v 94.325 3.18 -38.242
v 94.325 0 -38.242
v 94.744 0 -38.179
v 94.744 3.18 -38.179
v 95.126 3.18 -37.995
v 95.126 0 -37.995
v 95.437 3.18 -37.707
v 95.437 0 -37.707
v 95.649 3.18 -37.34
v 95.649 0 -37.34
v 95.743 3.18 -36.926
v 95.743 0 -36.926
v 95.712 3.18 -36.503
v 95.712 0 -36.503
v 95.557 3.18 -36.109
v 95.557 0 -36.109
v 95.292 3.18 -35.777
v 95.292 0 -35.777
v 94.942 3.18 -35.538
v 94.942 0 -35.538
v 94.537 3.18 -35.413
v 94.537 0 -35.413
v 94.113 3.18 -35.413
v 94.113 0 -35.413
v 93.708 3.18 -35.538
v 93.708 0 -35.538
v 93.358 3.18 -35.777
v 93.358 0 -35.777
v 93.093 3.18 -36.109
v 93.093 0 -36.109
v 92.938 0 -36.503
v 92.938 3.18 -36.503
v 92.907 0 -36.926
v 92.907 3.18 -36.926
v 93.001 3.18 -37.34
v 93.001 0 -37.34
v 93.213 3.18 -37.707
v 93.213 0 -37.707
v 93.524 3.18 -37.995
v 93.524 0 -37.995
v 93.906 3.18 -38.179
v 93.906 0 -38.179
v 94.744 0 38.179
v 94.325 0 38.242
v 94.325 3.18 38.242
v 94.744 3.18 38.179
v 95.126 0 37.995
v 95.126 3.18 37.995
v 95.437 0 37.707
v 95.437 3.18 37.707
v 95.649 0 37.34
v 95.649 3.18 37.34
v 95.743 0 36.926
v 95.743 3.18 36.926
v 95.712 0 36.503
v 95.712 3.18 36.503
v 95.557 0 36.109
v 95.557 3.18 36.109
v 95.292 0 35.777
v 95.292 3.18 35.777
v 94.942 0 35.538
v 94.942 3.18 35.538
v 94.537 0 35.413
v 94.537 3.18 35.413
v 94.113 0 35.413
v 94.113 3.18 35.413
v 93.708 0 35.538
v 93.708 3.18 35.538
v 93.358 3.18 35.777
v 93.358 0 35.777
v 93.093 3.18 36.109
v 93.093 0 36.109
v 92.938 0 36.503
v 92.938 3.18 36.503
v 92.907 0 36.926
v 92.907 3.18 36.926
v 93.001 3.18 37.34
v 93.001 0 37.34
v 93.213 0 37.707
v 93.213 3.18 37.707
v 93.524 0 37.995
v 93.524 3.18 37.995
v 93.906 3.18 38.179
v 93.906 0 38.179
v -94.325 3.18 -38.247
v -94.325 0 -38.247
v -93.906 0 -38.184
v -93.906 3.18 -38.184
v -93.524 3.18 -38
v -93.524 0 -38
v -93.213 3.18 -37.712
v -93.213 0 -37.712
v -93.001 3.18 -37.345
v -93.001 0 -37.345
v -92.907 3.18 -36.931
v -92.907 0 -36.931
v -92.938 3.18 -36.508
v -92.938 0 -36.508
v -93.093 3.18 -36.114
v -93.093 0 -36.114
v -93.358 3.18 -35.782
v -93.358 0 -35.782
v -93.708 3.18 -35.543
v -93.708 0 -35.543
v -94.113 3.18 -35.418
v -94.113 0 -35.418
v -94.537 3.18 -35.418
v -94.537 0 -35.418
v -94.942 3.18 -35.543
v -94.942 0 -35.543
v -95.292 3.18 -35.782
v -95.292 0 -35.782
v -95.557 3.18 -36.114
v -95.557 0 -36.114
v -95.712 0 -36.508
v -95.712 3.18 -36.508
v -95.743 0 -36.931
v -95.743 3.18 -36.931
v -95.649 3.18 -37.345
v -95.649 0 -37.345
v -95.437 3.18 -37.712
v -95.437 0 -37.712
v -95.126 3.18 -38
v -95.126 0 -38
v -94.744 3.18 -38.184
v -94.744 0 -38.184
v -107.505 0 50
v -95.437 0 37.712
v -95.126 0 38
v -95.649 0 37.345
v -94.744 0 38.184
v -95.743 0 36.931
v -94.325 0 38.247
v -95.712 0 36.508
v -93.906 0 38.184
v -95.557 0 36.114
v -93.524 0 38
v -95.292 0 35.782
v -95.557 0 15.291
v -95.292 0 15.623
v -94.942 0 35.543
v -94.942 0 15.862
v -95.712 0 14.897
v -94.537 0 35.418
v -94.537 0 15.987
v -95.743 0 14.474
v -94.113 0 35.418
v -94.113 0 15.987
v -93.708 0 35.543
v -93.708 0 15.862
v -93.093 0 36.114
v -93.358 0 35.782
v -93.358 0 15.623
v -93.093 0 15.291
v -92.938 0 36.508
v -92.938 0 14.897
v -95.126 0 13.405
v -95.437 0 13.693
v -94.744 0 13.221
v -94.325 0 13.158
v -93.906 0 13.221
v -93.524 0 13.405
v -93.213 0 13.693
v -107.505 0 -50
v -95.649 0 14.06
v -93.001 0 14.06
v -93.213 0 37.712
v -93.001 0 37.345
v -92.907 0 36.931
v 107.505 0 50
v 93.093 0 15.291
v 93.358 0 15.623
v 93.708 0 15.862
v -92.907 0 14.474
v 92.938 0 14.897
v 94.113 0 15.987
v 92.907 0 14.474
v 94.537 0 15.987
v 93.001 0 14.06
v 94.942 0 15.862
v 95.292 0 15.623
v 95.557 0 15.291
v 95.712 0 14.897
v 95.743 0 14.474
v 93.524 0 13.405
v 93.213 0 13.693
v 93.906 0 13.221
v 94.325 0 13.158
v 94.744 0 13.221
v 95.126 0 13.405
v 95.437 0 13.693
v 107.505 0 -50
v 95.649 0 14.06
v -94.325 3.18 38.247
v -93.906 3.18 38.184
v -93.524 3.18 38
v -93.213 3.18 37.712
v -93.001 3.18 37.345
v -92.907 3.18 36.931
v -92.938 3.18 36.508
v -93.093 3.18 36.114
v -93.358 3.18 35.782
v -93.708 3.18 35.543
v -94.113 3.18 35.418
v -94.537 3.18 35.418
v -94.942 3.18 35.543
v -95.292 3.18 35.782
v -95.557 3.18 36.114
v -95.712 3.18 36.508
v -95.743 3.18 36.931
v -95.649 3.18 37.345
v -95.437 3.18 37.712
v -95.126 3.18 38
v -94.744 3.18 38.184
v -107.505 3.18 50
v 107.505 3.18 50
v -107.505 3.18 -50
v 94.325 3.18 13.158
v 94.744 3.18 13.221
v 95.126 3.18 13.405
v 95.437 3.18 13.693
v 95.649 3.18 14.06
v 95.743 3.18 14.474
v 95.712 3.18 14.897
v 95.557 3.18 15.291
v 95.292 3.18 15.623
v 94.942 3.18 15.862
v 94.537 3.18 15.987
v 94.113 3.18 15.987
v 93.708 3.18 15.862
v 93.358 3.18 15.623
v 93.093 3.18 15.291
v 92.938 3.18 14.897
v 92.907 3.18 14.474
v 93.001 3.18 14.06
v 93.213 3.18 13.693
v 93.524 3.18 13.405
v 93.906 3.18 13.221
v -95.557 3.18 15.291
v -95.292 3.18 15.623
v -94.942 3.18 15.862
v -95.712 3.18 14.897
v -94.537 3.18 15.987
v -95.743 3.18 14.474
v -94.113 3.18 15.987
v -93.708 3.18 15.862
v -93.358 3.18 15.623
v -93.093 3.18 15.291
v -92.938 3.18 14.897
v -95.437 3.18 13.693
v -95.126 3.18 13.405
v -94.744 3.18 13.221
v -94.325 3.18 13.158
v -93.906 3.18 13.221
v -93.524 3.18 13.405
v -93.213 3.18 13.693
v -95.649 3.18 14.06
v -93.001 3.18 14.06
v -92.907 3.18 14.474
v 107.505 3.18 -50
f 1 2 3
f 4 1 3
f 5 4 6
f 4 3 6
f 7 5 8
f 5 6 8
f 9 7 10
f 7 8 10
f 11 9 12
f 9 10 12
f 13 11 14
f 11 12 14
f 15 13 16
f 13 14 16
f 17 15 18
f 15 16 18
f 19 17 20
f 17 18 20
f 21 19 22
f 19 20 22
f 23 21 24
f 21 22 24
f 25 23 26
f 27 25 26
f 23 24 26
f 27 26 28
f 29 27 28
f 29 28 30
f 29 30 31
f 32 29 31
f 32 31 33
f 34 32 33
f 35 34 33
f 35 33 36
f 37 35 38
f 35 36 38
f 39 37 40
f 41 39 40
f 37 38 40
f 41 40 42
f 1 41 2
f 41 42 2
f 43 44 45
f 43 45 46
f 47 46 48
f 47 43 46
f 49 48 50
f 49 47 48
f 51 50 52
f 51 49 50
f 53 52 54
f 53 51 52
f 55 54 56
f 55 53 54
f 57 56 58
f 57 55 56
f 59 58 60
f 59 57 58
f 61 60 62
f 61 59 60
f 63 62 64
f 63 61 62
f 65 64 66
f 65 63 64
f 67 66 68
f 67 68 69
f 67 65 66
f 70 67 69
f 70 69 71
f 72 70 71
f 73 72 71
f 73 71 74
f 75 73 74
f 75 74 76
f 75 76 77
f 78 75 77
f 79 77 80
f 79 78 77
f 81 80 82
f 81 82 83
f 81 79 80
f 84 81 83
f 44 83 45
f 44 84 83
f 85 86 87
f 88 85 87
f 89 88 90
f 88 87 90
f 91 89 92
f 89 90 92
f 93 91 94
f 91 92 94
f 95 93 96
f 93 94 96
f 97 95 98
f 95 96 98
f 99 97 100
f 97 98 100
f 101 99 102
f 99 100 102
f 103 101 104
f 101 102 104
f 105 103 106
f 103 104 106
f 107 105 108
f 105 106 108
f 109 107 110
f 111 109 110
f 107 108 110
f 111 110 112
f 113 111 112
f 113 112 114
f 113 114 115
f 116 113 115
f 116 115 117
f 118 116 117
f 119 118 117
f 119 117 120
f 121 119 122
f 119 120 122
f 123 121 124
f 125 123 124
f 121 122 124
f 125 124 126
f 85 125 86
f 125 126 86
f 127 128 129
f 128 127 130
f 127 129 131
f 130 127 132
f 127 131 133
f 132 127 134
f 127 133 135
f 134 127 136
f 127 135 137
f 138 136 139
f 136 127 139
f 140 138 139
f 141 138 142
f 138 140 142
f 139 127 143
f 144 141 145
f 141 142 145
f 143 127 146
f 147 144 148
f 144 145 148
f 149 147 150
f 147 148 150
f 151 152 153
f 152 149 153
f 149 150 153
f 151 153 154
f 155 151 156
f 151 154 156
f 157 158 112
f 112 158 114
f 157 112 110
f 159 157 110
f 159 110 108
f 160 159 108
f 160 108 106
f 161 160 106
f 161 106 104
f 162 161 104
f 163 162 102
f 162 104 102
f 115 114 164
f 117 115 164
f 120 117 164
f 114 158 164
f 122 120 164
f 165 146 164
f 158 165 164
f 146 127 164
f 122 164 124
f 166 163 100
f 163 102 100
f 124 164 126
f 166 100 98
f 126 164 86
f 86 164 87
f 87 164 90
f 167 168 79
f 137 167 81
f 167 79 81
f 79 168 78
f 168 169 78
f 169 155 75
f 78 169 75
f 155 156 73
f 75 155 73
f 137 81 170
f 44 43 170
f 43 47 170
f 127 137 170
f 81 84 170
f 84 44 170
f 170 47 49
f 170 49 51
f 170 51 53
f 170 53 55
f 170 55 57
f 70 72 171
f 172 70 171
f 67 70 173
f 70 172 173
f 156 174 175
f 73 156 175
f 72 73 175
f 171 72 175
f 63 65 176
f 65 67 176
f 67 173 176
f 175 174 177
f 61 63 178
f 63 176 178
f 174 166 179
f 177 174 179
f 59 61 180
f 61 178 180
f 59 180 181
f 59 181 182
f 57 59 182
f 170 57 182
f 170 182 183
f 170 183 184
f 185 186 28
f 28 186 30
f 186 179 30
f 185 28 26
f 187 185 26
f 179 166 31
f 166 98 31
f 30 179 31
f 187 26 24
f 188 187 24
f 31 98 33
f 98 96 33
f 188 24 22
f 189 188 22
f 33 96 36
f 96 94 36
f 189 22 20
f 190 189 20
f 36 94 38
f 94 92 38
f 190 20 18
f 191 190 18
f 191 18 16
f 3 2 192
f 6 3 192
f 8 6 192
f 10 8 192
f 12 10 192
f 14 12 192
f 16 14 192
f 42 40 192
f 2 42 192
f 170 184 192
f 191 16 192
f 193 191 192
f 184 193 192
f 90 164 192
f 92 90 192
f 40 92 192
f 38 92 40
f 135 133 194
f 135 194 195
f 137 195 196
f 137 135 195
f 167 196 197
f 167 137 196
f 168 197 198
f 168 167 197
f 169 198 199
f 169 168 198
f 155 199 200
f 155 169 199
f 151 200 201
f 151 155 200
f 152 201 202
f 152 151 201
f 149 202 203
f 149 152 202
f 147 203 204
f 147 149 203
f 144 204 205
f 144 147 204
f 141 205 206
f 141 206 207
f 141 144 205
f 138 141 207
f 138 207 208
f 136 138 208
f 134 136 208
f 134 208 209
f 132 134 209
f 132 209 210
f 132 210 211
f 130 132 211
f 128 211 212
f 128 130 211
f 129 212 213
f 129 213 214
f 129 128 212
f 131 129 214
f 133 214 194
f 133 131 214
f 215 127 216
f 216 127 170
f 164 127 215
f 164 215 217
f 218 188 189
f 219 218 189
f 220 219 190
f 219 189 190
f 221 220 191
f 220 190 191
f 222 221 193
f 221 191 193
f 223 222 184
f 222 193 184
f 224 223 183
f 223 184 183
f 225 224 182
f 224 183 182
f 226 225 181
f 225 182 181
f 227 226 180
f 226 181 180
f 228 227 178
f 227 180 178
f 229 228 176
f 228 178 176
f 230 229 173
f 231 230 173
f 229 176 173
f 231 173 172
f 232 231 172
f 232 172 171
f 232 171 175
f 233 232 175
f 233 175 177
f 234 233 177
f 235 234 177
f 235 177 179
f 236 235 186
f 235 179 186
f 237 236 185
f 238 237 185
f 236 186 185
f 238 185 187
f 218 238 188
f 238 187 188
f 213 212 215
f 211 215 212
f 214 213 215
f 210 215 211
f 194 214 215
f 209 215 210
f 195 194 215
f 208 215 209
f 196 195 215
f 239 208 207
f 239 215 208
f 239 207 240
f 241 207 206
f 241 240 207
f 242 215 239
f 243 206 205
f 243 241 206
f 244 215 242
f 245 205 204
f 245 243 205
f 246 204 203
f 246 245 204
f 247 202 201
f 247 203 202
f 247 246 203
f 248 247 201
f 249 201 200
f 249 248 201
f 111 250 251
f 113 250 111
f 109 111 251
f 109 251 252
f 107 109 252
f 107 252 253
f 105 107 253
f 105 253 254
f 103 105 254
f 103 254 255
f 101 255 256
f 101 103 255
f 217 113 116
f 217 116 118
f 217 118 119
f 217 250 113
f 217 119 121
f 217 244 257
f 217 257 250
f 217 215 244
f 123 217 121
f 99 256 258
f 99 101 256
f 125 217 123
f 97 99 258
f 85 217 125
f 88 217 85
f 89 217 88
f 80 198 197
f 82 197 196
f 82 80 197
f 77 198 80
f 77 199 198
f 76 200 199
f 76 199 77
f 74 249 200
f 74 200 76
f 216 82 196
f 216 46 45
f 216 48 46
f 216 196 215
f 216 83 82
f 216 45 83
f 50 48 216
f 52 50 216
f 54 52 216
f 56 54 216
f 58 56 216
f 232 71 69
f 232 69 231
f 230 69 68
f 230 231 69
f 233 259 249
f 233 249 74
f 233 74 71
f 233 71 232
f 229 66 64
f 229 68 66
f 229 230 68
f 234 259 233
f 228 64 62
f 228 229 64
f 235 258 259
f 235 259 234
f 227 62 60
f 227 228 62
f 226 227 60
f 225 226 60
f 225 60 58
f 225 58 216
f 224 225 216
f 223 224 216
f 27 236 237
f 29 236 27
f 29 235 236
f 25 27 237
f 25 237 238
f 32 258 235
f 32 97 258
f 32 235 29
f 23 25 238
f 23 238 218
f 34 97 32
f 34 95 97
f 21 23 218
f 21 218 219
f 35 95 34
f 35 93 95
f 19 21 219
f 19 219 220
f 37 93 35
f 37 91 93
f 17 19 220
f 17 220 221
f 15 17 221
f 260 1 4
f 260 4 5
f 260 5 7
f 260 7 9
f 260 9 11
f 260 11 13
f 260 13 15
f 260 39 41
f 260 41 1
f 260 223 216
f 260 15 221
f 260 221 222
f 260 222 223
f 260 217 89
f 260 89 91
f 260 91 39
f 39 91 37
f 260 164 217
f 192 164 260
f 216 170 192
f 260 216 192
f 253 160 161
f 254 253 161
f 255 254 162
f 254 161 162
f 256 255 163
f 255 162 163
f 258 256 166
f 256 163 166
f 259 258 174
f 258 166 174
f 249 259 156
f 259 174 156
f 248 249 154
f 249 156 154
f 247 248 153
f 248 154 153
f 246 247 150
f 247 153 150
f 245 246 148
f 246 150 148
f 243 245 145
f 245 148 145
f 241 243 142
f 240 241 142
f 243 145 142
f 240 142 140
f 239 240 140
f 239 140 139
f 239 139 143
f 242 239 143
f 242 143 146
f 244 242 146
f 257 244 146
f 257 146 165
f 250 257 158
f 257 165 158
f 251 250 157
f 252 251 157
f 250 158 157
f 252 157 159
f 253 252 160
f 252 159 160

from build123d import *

# Parameters (mm, degrees)
SKETCH1_W           = 215.01
SKETCH1_H           = 100
BOSS_EXTRUDE1_DEPTH = 3.18
SKETCH2_R           = 1.4224
CUT_EXTRUDE1_DEPTH  = 3.18
SKETCH4_R           = 1.4224
CUT_EXTRUDE4_DEPTH  = 3.18


with BuildPart() as part:
    # Sketch1 → Boss-Extrude1 (new body)
    with BuildSketch(Plane(origin=(0, 0, 0), x_dir=(1, 0, 0), z_dir=(0, 1, 0))):
        Rectangle(SKETCH1_W, SKETCH1_H)
    extrude(amount=BOSS_EXTRUDE1_DEPTH)

    # Sketch2 → Cut-Extrude1 (cut)
    with BuildSketch(Plane.XZ):
        with Locations(Location((-94.325, -36.825, 0), (0, 0, 270))):
            Circle(SKETCH2_R)
        with Locations(Location((94.325, -36.82, 0), (0, 0, 270))):
            Circle(SKETCH2_R)
    cut_extrude1 = extrude(amount=-CUT_EXTRUDE1_DEPTH, mode=Mode.SUBTRACT)

    # Mirror1: Cut-Extrude1 across plane
    add(cut_extrude1.mirror(Plane.XY), mode=Mode.SUBTRACT)

    # Sketch4 → Cut-Extrude4 (cut)
    with BuildSketch(Plane.XZ):
        with Locations(Location((-94.325, 14.58, 0), (0, 0, 270))):
            Circle(SKETCH4_R)
        with Locations(Location((94.325, 14.58, 0), (0, 0, 270))):
            Circle(SKETCH4_R)
    extrude(amount=-CUT_EXTRUDE4_DEPTH, mode=Mode.SUBTRACT)


solid = part.part
